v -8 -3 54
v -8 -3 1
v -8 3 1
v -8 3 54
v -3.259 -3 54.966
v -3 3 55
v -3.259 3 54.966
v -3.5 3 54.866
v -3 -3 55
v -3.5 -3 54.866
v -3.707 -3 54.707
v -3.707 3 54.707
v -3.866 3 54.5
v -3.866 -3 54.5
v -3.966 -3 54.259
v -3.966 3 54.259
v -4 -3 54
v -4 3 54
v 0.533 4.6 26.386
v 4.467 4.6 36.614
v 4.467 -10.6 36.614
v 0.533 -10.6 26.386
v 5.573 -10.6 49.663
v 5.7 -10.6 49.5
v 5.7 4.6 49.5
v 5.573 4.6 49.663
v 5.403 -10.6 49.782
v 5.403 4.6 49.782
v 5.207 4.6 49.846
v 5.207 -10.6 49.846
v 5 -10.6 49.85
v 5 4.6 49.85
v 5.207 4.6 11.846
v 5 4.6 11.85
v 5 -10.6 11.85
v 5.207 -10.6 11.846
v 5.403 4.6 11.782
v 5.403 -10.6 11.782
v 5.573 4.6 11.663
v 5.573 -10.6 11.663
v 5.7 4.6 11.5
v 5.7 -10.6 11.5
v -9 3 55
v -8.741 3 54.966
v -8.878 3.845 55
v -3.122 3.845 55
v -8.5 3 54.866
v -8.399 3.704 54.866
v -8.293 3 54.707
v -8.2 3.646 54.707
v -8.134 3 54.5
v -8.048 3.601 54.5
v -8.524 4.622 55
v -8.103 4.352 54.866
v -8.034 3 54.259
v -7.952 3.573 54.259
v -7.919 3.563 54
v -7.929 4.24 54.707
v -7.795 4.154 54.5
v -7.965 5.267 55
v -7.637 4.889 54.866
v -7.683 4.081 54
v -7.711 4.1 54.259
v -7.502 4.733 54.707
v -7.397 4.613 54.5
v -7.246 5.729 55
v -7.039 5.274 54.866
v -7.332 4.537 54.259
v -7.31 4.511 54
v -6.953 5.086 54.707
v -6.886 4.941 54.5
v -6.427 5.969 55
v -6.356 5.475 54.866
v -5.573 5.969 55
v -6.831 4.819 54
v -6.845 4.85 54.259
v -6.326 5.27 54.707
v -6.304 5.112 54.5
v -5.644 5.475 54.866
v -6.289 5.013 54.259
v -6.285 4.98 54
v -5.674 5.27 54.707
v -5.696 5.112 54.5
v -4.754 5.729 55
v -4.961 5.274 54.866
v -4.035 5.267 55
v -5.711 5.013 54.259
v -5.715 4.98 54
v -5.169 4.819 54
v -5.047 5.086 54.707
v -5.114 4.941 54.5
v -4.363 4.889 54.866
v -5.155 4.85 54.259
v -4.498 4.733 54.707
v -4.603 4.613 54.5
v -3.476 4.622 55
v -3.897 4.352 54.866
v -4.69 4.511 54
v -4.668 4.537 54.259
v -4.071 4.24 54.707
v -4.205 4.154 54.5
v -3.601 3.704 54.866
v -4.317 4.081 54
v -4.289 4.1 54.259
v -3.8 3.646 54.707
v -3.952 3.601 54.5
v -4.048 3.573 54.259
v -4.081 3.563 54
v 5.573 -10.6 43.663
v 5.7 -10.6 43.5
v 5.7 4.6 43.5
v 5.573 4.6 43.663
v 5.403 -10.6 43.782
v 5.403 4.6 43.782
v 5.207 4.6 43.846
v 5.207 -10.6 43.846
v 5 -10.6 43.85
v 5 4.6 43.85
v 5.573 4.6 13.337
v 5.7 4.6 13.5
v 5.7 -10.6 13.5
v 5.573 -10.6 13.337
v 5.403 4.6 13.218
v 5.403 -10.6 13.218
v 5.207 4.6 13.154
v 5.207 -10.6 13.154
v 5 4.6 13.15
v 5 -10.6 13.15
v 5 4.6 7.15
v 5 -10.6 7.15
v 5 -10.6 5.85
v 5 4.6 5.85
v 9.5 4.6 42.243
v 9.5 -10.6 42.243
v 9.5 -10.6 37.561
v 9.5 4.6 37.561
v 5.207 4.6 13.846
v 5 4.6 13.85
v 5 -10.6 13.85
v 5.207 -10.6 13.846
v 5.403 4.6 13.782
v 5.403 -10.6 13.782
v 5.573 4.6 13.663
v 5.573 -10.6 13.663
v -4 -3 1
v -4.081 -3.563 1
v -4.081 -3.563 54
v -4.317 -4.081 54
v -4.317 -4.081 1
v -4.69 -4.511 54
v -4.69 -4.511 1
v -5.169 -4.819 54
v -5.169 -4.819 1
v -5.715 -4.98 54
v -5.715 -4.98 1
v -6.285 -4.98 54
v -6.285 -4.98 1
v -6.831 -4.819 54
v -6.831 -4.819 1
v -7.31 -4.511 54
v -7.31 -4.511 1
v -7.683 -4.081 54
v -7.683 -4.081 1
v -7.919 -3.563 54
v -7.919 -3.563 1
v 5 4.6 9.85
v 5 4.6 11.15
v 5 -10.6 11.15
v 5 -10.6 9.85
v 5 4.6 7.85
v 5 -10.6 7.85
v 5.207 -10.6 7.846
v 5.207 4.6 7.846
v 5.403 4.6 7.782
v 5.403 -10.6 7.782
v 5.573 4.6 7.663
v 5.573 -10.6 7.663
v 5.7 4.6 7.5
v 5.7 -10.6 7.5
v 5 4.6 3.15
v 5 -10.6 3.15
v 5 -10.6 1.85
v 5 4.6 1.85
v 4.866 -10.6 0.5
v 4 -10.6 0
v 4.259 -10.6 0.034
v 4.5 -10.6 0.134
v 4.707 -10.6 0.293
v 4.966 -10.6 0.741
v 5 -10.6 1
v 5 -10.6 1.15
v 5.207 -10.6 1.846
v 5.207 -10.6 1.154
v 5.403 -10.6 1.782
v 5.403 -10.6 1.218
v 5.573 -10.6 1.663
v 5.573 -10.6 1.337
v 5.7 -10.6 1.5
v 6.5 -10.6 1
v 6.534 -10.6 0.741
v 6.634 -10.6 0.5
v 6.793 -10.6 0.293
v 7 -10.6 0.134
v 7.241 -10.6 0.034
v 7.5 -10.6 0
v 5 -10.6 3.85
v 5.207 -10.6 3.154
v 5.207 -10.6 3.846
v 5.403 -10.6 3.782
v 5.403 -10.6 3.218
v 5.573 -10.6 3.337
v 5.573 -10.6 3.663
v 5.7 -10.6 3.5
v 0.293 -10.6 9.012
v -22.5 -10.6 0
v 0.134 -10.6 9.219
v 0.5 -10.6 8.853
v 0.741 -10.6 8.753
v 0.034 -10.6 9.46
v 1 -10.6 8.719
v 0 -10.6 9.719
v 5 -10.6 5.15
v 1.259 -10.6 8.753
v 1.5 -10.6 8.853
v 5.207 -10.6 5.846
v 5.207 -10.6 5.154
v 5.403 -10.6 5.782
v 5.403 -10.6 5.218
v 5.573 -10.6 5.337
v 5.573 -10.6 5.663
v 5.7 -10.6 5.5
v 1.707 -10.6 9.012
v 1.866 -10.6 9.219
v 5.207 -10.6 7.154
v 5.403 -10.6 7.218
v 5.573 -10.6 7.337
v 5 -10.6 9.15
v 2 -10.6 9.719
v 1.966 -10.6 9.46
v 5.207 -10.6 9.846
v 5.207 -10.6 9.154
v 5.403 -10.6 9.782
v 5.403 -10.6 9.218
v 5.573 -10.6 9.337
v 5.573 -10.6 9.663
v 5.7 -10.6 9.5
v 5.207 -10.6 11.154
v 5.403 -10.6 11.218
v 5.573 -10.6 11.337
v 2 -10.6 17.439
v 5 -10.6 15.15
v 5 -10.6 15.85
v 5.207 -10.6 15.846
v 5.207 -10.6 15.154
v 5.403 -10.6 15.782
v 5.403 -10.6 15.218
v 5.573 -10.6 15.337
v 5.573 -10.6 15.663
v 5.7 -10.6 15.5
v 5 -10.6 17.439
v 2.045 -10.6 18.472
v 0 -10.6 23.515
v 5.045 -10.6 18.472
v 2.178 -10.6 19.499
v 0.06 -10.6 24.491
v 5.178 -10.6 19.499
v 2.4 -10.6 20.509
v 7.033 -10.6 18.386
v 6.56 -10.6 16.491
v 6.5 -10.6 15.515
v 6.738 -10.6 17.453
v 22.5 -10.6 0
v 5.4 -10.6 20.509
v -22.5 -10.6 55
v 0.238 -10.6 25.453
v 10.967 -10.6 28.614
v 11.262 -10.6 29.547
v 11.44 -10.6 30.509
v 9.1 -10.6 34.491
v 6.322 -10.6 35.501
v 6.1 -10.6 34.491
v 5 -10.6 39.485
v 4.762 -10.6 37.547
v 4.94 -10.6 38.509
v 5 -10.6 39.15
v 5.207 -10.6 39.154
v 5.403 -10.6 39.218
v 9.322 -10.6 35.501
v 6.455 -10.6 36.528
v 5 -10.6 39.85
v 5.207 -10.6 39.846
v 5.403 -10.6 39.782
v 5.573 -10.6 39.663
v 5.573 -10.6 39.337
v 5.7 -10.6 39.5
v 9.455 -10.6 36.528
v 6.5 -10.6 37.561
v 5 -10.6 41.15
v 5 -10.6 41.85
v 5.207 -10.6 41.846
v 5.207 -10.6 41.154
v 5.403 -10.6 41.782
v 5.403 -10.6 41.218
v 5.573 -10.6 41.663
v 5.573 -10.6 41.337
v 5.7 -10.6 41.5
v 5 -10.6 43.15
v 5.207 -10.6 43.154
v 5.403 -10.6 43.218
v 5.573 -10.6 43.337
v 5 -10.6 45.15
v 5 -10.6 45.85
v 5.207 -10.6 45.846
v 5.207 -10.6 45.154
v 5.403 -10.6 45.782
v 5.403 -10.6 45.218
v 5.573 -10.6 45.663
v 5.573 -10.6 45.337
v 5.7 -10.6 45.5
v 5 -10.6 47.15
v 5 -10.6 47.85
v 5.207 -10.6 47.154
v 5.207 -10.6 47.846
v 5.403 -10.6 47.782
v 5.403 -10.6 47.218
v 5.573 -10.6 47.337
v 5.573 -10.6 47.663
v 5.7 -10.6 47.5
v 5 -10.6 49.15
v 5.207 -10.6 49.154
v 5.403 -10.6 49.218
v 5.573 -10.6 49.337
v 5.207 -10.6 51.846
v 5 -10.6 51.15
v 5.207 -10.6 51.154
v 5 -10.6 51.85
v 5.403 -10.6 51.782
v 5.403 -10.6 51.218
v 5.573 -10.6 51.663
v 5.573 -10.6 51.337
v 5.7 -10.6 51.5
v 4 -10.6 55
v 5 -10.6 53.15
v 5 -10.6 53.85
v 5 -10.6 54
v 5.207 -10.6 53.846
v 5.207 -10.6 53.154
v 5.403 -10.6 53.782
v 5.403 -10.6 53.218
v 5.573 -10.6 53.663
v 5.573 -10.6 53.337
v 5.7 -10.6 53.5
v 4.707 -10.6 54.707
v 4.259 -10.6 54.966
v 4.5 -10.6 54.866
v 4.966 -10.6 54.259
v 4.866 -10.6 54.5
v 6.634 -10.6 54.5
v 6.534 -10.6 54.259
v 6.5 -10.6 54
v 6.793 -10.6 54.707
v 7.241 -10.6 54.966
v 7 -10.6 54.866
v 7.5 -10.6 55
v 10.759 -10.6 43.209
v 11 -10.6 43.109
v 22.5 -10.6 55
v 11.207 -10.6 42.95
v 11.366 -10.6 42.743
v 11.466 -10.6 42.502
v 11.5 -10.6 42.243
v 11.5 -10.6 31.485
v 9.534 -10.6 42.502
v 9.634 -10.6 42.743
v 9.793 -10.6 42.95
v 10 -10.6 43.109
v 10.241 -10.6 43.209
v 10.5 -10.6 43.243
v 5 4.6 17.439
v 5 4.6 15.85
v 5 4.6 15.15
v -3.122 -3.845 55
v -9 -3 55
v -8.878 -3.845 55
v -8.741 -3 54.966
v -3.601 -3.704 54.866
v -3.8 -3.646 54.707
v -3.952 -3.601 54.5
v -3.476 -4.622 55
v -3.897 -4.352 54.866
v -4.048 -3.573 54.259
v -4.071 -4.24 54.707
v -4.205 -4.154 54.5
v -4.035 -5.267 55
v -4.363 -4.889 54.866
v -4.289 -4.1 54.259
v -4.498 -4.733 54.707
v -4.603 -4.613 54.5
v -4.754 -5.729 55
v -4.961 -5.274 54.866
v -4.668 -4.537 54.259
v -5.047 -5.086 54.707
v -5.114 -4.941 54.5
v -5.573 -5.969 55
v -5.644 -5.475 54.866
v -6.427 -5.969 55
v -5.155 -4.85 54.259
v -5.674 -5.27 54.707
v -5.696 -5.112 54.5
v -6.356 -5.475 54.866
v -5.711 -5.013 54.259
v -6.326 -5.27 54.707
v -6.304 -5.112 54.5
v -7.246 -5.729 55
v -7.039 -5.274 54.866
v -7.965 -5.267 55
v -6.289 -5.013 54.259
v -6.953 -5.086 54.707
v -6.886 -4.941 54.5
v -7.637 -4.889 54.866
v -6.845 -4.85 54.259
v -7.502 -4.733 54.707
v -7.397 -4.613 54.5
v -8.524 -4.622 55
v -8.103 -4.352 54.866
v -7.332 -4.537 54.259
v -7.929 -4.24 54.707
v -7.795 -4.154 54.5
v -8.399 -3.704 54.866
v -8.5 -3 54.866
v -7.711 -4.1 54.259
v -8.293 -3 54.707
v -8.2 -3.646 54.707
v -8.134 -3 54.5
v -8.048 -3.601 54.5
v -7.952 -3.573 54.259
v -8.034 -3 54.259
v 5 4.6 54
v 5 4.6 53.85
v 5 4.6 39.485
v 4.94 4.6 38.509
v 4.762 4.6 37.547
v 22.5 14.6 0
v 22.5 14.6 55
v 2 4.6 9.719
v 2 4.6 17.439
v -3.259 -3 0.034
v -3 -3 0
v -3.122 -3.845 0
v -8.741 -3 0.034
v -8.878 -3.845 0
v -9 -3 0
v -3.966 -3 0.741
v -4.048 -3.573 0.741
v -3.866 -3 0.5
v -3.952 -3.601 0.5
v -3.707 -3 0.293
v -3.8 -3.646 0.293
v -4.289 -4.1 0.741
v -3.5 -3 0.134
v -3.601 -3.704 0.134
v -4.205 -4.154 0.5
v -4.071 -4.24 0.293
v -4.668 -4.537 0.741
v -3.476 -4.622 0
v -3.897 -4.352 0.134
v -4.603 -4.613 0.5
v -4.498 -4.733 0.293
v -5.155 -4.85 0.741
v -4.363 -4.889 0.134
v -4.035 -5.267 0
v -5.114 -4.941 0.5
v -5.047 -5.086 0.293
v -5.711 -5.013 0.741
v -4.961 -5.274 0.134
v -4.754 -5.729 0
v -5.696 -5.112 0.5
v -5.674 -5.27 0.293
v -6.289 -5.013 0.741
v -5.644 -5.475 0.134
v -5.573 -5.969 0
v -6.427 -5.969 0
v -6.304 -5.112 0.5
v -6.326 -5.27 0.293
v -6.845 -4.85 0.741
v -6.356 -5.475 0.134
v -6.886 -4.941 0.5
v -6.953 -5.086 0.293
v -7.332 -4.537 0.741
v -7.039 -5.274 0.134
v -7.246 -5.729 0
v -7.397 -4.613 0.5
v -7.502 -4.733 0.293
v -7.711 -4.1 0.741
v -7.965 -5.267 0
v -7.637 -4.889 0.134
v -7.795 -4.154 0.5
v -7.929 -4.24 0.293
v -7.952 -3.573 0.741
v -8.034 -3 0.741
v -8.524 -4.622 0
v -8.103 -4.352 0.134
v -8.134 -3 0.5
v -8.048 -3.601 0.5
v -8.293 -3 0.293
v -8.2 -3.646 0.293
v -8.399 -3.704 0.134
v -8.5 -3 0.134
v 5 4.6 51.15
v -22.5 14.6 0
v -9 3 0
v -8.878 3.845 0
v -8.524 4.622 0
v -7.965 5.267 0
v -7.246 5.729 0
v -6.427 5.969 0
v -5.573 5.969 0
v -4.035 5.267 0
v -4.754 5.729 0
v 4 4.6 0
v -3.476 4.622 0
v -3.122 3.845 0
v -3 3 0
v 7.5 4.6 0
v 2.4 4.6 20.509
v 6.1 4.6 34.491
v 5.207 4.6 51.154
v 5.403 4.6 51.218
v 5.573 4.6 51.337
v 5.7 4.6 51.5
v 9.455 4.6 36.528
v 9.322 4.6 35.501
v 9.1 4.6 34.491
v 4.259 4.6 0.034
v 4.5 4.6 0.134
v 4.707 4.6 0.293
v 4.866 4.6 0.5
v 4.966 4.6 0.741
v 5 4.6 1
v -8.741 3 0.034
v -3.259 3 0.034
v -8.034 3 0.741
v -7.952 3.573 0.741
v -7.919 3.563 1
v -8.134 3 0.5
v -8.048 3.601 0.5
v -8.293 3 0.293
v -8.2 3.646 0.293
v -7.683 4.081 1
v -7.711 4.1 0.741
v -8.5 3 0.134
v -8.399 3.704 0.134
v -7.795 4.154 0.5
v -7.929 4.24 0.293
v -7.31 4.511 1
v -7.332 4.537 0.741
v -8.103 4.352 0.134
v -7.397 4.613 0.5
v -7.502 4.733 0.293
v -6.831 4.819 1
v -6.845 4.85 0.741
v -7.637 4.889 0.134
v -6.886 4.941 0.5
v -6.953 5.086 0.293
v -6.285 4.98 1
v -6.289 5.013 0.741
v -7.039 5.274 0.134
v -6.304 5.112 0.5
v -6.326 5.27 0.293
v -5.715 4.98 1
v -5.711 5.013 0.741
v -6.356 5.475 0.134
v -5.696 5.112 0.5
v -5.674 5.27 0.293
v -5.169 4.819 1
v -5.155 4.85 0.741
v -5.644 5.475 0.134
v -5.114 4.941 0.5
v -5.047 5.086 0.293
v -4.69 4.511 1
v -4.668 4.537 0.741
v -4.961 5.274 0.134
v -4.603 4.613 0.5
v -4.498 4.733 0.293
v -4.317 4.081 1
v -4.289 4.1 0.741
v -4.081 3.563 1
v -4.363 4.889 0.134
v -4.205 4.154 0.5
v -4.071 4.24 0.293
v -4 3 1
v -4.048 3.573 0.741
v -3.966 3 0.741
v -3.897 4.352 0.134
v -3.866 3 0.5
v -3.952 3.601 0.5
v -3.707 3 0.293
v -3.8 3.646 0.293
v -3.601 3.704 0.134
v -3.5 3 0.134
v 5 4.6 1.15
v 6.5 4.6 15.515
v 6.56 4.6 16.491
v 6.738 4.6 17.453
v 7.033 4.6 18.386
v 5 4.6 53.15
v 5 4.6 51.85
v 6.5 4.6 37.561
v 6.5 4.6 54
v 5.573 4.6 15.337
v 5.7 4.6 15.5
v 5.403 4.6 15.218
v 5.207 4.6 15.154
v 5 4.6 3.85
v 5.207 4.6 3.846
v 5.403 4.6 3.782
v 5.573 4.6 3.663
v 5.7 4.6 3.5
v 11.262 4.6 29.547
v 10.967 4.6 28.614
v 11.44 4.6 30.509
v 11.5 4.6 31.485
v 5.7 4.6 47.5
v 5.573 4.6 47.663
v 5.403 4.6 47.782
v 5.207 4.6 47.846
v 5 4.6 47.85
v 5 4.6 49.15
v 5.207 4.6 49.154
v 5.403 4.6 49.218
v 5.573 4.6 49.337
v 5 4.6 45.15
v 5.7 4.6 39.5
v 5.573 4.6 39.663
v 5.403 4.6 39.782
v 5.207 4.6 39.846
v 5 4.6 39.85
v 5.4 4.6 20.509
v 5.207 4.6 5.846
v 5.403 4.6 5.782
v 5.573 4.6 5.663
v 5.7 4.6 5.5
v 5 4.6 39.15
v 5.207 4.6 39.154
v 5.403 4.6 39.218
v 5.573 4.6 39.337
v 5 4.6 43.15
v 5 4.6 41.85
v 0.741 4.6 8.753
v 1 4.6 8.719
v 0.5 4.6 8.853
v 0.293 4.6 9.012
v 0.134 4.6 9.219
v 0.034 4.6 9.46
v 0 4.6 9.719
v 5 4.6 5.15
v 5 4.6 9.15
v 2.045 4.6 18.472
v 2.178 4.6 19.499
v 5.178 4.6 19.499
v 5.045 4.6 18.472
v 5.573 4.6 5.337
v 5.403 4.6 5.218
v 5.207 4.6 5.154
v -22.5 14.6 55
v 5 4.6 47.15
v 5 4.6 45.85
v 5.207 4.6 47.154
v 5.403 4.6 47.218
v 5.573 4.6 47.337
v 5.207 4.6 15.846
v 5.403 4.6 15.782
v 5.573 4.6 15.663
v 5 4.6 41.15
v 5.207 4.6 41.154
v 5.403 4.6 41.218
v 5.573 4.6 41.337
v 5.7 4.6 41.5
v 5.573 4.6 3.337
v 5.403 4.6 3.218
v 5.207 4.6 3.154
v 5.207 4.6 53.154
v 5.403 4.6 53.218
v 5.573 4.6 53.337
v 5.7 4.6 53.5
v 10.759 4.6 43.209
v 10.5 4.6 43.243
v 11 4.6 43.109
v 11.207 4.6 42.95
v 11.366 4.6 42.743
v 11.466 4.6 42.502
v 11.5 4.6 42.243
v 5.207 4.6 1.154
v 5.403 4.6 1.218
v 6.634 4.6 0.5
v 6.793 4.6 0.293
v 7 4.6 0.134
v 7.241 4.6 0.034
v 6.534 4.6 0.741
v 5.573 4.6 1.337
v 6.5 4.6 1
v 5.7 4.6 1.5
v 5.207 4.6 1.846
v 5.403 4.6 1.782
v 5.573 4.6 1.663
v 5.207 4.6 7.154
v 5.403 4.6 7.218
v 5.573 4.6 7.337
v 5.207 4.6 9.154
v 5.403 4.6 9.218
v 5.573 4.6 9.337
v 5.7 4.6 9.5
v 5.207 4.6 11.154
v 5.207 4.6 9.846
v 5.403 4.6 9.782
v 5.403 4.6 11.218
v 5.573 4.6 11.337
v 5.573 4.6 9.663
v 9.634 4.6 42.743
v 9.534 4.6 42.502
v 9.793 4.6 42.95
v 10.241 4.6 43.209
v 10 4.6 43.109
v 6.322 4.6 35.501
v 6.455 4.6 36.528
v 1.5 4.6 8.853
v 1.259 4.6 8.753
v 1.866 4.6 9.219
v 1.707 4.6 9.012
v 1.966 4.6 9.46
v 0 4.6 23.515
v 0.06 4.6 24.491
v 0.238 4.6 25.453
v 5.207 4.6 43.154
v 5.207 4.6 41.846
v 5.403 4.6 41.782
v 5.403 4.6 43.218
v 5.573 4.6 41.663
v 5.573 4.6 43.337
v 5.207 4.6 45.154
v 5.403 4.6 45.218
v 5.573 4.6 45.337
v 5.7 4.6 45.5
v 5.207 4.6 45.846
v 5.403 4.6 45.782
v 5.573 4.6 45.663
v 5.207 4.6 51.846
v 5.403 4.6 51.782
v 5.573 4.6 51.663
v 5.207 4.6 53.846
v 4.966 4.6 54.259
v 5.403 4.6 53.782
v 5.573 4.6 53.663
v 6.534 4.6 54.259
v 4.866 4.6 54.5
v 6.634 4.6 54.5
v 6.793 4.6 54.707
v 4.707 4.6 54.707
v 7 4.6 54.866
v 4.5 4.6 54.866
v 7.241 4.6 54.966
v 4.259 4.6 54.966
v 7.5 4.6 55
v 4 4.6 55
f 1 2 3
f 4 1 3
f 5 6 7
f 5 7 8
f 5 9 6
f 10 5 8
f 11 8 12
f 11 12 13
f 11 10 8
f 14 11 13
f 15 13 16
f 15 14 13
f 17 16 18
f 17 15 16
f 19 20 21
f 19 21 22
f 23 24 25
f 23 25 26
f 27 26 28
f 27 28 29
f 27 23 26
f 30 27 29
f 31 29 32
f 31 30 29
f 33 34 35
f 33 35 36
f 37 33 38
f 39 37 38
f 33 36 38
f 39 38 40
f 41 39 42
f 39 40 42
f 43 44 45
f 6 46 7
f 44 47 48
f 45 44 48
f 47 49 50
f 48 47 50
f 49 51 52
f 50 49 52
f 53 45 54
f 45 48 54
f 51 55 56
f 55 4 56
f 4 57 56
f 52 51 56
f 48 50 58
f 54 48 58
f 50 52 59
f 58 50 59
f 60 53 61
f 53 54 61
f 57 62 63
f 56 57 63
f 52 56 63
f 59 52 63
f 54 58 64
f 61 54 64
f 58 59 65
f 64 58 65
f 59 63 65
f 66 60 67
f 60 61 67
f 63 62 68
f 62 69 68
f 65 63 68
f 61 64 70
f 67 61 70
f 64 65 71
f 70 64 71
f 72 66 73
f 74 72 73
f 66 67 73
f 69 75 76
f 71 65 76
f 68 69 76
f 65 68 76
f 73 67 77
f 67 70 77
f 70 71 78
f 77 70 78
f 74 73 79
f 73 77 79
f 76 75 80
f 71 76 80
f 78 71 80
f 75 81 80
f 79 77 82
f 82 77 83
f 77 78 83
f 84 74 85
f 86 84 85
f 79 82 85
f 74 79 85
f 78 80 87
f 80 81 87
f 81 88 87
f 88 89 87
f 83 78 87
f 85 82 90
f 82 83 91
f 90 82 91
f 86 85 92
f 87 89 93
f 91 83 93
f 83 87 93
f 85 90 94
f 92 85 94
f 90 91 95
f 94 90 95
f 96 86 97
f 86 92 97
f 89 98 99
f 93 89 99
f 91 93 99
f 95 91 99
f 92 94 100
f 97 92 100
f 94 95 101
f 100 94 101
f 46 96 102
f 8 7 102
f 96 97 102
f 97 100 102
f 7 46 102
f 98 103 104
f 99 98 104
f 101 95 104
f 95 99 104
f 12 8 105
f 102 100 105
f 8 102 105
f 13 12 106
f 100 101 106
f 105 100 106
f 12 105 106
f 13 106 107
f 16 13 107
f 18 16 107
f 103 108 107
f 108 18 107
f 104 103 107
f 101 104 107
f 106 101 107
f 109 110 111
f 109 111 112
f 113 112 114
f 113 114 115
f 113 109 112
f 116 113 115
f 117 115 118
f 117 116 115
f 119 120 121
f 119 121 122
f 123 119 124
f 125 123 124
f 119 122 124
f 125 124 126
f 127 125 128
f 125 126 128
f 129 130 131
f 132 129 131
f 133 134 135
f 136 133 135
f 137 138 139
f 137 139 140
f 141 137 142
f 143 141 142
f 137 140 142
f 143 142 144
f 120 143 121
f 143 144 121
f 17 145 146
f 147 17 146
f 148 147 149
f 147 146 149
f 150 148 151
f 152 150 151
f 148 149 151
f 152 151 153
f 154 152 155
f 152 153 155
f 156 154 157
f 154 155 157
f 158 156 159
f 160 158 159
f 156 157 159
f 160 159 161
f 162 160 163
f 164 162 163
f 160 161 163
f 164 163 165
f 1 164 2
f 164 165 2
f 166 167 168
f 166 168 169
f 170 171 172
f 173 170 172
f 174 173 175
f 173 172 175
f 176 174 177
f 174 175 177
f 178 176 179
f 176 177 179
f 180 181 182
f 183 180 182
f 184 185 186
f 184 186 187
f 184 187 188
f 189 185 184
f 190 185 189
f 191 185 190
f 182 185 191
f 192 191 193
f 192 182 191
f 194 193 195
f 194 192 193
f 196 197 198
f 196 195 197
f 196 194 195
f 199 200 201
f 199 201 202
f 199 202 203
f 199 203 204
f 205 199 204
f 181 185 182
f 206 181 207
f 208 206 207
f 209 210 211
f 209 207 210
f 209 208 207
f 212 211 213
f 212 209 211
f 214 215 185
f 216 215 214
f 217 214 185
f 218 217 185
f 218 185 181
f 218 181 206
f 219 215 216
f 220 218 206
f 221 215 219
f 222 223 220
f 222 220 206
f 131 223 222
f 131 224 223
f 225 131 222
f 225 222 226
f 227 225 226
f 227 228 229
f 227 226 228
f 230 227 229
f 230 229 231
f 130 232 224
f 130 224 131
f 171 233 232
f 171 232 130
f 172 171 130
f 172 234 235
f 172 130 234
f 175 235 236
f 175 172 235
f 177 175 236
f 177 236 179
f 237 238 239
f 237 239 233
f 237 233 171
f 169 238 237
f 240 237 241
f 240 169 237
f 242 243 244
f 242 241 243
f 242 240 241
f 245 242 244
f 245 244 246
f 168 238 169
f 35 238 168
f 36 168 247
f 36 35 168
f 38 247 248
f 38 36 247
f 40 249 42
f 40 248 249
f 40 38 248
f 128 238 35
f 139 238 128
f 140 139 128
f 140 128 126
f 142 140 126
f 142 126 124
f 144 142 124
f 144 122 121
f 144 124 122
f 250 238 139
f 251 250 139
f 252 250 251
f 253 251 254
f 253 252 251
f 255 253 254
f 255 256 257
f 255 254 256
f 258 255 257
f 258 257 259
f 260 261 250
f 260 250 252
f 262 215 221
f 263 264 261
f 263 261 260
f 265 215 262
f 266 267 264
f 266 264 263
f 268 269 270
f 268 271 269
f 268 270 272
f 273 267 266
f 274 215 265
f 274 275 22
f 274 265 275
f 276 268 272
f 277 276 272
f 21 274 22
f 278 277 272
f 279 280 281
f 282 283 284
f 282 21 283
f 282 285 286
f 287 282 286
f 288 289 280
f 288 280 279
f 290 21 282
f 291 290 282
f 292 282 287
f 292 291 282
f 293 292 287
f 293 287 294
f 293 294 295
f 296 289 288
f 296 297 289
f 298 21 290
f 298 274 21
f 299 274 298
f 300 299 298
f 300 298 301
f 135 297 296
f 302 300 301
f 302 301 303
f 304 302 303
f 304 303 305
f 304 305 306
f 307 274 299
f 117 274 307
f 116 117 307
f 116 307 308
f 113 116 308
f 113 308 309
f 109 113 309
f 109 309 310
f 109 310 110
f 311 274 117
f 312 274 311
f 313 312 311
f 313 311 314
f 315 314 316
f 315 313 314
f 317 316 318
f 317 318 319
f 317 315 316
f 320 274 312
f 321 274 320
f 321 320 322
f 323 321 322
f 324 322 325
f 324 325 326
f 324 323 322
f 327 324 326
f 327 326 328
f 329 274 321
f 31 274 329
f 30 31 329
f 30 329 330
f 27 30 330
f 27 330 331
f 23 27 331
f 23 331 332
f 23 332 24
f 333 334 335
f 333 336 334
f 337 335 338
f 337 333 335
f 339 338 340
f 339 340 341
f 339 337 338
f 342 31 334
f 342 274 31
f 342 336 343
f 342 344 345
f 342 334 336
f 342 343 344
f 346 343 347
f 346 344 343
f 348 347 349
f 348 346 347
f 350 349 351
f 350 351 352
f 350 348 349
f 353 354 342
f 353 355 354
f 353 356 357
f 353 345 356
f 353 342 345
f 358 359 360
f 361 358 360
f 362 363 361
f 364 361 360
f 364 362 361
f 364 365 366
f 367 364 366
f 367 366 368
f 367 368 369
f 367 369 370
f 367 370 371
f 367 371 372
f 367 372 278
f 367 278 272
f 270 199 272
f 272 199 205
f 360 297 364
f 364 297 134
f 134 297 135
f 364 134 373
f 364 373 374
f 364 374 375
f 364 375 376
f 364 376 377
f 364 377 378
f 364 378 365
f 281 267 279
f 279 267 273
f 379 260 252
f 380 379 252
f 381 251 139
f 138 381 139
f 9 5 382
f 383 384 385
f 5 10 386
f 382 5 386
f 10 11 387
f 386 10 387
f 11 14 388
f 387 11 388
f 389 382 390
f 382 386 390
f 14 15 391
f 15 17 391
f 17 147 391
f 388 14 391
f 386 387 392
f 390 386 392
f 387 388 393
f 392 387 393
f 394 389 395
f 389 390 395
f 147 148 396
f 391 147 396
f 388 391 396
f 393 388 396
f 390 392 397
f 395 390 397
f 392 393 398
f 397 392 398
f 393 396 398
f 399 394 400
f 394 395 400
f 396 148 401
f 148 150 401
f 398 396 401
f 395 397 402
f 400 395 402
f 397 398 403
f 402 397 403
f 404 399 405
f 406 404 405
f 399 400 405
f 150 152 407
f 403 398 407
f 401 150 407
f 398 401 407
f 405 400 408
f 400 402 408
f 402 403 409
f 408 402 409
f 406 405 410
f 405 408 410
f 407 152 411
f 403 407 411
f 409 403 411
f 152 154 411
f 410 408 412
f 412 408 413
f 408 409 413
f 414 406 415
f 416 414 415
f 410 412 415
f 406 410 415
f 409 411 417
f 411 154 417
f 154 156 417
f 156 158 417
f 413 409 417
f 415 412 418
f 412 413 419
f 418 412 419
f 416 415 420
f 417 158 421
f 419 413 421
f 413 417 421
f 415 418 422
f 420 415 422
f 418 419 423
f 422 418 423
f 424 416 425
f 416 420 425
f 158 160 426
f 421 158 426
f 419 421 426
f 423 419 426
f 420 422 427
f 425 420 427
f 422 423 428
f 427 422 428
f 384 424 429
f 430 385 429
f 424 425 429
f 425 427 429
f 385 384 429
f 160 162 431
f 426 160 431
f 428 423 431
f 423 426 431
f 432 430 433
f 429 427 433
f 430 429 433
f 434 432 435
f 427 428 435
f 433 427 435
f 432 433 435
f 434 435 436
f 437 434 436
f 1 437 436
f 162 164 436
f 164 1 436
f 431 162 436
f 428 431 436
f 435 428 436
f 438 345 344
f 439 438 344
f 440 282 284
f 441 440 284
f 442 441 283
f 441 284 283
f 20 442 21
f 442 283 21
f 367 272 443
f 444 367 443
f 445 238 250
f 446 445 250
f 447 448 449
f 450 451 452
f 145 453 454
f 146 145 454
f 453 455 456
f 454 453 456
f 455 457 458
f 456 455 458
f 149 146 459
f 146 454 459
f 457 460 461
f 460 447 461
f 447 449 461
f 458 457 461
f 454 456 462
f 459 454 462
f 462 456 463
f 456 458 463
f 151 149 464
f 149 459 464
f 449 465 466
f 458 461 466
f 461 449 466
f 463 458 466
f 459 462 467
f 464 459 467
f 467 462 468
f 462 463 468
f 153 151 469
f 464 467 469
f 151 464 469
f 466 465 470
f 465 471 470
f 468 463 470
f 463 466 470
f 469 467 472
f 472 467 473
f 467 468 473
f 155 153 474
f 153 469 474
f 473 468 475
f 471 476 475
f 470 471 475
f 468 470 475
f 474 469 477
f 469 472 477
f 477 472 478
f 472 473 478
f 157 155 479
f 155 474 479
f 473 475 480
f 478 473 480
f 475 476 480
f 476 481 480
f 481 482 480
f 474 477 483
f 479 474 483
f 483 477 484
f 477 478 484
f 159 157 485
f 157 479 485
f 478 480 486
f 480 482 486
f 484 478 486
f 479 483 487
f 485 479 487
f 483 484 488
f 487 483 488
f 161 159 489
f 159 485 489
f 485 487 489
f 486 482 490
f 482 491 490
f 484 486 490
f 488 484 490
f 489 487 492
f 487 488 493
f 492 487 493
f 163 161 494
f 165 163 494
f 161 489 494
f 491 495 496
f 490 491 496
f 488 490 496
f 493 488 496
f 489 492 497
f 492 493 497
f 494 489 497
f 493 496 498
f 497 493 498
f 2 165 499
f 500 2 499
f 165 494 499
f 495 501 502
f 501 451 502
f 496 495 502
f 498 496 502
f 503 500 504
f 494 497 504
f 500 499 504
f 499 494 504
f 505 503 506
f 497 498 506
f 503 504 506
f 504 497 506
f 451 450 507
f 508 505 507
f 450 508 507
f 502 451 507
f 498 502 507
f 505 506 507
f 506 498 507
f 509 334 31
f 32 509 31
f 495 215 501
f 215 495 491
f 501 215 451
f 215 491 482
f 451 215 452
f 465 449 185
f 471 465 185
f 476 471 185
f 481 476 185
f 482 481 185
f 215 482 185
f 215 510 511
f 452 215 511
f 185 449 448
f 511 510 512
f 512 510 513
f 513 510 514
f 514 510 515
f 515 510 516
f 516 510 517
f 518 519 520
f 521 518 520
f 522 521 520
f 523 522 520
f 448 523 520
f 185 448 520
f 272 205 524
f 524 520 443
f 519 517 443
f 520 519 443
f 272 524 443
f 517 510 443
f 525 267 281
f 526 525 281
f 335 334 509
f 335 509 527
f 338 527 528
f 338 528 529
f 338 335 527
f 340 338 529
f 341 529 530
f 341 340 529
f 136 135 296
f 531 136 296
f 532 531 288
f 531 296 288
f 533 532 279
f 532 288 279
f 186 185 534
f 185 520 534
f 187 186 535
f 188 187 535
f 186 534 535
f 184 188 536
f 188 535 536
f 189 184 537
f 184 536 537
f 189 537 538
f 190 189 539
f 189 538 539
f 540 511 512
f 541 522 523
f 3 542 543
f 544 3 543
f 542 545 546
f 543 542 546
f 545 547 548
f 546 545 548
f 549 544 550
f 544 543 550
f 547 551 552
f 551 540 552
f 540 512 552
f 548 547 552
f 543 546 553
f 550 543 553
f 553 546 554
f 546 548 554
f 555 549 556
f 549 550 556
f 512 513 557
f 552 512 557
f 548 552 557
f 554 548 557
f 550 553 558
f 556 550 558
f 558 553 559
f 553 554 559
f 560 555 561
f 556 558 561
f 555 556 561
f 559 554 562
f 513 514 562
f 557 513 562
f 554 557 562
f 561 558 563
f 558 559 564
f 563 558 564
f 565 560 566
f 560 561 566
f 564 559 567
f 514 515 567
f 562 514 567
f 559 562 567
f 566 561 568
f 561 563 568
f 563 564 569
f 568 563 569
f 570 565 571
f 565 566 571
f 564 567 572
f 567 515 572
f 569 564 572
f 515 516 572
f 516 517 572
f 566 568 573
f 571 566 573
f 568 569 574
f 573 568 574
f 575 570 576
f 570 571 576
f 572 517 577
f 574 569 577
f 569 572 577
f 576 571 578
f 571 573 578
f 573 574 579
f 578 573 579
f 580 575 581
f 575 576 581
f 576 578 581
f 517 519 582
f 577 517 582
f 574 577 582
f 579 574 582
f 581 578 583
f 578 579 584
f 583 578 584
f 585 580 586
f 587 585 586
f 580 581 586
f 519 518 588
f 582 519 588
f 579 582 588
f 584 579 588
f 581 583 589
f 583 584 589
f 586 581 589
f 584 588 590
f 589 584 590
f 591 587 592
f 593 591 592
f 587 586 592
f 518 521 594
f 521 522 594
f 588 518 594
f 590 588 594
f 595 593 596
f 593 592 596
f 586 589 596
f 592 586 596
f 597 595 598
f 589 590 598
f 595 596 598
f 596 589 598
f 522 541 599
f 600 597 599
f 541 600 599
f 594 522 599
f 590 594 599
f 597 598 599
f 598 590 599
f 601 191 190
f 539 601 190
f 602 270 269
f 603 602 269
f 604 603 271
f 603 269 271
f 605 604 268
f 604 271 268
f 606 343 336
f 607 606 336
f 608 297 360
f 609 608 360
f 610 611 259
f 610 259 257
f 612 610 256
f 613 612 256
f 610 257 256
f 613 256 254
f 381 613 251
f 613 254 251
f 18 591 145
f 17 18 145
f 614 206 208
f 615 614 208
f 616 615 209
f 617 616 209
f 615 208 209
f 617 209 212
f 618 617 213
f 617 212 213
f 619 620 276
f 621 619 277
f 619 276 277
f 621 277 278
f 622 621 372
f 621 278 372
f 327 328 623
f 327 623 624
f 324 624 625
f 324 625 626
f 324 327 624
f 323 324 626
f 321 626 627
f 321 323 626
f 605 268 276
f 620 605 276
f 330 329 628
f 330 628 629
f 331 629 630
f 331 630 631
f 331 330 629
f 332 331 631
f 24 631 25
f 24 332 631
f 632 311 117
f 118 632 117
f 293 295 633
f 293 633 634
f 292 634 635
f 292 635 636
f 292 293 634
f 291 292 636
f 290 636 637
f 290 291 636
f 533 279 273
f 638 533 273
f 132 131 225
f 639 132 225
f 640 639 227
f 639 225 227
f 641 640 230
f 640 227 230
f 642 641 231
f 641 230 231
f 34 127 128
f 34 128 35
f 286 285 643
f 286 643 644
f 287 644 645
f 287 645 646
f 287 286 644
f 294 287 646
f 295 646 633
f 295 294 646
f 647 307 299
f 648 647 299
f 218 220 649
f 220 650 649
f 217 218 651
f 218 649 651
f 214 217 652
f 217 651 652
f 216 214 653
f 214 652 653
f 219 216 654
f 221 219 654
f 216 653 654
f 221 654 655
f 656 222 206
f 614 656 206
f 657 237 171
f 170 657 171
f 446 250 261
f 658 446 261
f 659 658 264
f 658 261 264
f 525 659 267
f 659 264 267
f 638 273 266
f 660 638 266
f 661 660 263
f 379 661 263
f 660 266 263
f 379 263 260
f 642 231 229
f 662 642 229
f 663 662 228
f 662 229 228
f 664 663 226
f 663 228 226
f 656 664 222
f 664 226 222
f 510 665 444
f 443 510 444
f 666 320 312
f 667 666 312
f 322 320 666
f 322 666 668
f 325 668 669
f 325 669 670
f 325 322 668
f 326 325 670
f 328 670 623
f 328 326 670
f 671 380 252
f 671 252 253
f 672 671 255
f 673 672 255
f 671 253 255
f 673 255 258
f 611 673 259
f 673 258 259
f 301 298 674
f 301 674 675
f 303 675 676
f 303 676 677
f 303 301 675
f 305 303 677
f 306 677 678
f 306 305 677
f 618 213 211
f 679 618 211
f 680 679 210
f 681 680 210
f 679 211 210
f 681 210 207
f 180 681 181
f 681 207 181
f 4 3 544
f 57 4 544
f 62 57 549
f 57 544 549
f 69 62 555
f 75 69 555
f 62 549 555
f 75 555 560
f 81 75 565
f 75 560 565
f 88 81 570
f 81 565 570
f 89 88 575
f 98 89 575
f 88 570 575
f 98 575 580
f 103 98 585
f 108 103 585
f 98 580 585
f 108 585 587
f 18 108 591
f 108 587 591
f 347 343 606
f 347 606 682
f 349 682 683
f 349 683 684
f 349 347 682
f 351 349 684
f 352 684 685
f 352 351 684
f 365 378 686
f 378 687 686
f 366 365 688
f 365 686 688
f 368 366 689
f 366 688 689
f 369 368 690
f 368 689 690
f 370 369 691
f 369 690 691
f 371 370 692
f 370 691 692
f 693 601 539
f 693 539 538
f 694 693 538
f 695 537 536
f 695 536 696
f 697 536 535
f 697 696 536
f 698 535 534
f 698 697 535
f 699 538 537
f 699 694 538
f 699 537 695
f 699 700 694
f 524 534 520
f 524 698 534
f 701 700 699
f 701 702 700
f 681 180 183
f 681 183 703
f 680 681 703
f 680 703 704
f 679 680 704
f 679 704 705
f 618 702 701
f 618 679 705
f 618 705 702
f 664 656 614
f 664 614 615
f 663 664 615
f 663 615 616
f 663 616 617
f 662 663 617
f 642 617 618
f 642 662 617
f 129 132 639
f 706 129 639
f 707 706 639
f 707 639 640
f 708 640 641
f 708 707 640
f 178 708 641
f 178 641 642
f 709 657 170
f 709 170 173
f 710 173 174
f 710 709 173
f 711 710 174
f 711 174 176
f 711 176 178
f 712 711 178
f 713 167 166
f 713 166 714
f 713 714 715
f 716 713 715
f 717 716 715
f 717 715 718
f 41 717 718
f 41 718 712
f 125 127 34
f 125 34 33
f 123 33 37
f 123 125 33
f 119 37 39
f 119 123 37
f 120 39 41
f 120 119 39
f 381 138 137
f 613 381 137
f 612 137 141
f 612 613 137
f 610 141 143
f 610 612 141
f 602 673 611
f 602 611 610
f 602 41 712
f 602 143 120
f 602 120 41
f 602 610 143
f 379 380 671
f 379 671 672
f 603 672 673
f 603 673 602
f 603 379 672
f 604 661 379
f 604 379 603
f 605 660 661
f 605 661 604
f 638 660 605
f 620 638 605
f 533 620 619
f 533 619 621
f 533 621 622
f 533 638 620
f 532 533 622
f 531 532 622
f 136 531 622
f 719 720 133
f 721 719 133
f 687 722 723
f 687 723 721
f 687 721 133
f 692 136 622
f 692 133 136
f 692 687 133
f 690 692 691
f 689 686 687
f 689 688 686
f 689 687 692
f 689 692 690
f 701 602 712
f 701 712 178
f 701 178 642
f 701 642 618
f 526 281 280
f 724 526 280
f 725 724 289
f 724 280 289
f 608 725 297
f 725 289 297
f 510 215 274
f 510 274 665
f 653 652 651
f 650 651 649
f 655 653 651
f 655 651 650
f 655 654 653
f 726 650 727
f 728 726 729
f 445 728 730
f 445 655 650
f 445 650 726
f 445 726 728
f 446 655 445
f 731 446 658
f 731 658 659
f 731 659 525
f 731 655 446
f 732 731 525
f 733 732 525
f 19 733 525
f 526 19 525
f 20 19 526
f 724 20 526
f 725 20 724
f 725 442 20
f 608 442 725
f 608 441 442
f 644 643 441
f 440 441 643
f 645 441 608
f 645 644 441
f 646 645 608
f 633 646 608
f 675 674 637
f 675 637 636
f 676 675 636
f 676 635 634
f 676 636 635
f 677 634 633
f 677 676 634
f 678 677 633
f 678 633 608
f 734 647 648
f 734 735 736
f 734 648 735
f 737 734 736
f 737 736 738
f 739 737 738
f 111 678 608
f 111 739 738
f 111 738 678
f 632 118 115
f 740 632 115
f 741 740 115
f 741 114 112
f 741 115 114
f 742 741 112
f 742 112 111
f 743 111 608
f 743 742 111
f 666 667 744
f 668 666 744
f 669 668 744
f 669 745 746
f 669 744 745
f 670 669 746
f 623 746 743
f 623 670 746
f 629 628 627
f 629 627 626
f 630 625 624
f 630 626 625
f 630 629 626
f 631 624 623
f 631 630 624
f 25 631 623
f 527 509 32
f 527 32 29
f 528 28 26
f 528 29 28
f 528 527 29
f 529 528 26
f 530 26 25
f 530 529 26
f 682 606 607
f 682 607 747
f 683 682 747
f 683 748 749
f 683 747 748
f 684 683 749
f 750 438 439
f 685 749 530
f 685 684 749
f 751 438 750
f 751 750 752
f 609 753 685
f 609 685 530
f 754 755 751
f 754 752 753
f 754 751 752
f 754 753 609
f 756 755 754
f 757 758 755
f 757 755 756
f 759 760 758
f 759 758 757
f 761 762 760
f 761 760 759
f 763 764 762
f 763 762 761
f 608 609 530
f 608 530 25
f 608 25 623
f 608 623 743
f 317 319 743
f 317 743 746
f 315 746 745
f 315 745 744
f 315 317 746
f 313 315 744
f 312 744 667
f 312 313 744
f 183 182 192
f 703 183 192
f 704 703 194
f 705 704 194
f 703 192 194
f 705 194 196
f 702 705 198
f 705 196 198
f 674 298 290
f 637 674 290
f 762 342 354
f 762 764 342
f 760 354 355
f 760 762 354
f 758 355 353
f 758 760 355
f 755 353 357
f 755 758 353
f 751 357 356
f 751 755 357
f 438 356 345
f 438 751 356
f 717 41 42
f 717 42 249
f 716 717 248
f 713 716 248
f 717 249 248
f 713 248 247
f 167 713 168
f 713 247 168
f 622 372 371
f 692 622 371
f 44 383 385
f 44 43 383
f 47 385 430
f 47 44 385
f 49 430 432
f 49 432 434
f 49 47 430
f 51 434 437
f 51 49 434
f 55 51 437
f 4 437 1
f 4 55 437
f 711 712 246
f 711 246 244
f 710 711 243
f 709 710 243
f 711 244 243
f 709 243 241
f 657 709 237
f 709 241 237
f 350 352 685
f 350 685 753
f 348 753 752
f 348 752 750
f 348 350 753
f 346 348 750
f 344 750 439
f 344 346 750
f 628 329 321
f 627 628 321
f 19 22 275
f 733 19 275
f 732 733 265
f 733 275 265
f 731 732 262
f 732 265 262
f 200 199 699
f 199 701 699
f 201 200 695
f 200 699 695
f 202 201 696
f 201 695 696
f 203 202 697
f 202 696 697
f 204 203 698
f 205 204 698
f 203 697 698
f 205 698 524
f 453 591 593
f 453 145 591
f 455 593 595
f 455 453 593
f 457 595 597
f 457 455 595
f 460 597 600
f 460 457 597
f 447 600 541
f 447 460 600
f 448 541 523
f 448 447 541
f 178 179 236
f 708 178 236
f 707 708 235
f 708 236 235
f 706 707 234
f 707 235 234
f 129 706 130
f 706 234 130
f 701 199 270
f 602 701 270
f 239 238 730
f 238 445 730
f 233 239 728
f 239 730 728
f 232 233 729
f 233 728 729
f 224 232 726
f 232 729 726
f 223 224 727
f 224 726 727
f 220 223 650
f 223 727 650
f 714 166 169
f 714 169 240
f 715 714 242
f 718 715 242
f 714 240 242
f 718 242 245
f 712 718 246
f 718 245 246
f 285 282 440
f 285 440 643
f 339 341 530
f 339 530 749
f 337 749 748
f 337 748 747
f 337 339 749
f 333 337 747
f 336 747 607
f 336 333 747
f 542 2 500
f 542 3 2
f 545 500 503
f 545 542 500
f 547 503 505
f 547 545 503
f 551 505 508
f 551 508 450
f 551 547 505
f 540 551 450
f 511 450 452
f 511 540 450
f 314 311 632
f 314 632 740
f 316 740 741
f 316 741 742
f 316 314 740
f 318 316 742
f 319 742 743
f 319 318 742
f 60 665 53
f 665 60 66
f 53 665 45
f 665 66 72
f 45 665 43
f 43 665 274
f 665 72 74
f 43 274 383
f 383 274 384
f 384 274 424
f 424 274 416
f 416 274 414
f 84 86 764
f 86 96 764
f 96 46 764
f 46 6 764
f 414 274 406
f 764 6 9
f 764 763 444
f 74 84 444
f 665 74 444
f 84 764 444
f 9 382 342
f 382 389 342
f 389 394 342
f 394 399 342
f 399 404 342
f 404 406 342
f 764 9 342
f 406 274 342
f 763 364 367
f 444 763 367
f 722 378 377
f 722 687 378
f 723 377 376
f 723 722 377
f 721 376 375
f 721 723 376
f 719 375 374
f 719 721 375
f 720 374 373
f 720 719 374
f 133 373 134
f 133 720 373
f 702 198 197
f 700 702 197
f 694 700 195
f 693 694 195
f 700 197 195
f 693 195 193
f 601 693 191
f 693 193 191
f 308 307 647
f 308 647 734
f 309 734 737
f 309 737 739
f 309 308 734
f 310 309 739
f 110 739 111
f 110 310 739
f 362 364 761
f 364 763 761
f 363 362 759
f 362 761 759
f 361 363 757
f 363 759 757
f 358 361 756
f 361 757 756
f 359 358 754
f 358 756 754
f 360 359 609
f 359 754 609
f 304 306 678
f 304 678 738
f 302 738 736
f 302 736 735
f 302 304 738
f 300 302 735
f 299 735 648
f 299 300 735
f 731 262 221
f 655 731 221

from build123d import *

# Parameters (mm, degrees)
ESQUISSE1_W             = 45
ESQUISSE1_H             = 25.2
BOSS_EXTRU_1_DEPTH      = 55
ENL_V_MAT_EXTRU_1_DEPTH = 15.2
ESQUISSE4_W             = 2
ESQUISSE4_H             = 11.757289378
ESQUISSE4_H_2           = 8.71932614
BOSS_EXTRU_2_DEPTH      = 15.2
BOSS_EXTRU_3_DEPTH      = 15.2
CONG_2_R                = 1
CONG_5_R                = 1
CONG_10_R               = 1


with BuildPart() as part:
    # Esquisse1 → Boss.-Extru.1 (new body)
    with BuildSketch(Plane.XY):
        with Locations((0, 2)):
            Rectangle(ESQUISSE1_W, ESQUISSE1_H)
        with BuildLine():
            Line((-4, 3), (-4, -3))
            ThreePointArc((-4, -3), (-6, -5), (-8, -3))
            Line((-8, -3), (-8, 3))
            ThreePointArc((-8, 3), (-6, 5), (-4, 3))
        make_face(mode=Mode.SUBTRACT)
    extrude(amount=BOSS_EXTRU_1_DEPTH)

    # Esquisse3 → Enlèv. mat.-Extru.1 (cut)
    with BuildSketch(Plane.XZ.offset(10.6)):
        with BuildLine():
            Line((5, 55), (5, 39.485421243))
            ThreePointArc((5, 39.485421243), (4.865561607, 38.024962206), (4.46676485, 36.613588609))
            Line((4.46676485, 36.613588609), (0.53323515, 26.386411391))
            ThreePointArc((0.53323515, 26.386411391), (0.134438393, 24.975037794), (0, 23.514578757))
            Line((0, 23.514578757), (0, 0))
            Line((0, 0), (2, 0))
            Line((2, 0), (2, 17.43865228))
            ThreePointArc((2, 17.43865228), (2.100303516, 18.986949278), (2.399537266, 20.509363004))
            Line((2.399537266, 20.509363004), (6.100462734, 34.490636996))
            ThreePointArc((6.100462734, 34.490636996), (6.399696484, 36.013050722), (6.5, 37.56134772))
            Line((6.5, 37.56134772), (6.5, 55))
            Line((6.5, 55), (5, 55))
        make_face()
        with BuildLine():
            Line((5, 17.43865228), (5, 0))
            Line((5, 0), (6.5, 0))
            Line((6.5, 0), (6.5, 15.514578757))
            ThreePointArc((6.5, 15.514578757), (6.634438393, 16.975037794), (7.03323515, 18.386411391))
            Line((7.03323515, 18.386411391), (10.96676485, 28.613588609))
            ThreePointArc((10.96676485, 28.613588609), (11.365561607, 30.024962206), (11.5, 31.485421243))
            Line((11.5, 31.485421243), (11.5, 55))
            Line((11.5, 55), (9.5, 55))
            Line((9.5, 55), (9.5, 37.56134772))
            ThreePointArc((9.5, 37.56134772), (9.399696484, 36.013050722), (9.100462734, 34.490636996))
            Line((9.100462734, 34.490636996), (5.399537266, 20.509363004))
            ThreePointArc((5.399537266, 20.509363004), (5.100303516, 18.986949278), (5, 17.43865228))
        make_face()
    extrude(amount=-ENL_V_MAT_EXTRU_1_DEPTH, mode=Mode.SUBTRACT)

    # Esquisse4 → Boss.-Extru.2 (add)
    with BuildSketch(Plane.XZ.offset(10.6)):
        with Locations((10.5, 49.121355311)):
            Rectangle(ESQUISSE4_W, ESQUISSE4_H)
        with Locations((1, 4.35966307)):
            Rectangle(ESQUISSE4_W, ESQUISSE4_H_2)
    extrude(amount=-BOSS_EXTRU_2_DEPTH)

    # Esquisse5 → Boss.-Extru.3 (add)
    with BuildSketch(Plane.XZ.offset(10.6)):
        with BuildLine():
            Line((5, 53.85), (5, 53.15))
            ThreePointArc((5, 53.15), (5.40348257, 53.21803486), (5.7, 53.5))
            ThreePointArc((5.7, 53.5), (5.40348257, 53.78196514), (5, 53.85))
        make_face()
        with BuildLine():
            Line((5, 51.85), (5, 51.15))
            ThreePointArc((5, 51.15), (5.40348257, 51.21803486), (5.7, 51.5))
            ThreePointArc((5.7, 51.5), (5.40348257, 51.78196514), (5, 51.85))
        make_face()
        with BuildLine():
            Line((5, 49.85), (5, 49.15))
            ThreePointArc((5, 49.15), (5.40348257, 49.21803486), (5.7, 49.5))
            ThreePointArc((5.7, 49.5), (5.40348257, 49.78196514), (5, 49.85))
        make_face()
        with BuildLine():
            Line((5, 47.85), (5, 47.15))
            ThreePointArc((5, 47.15), (5.40348257, 47.21803486), (5.7, 47.5))
            ThreePointArc((5.7, 47.5), (5.40348257, 47.78196514), (5, 47.85))
        make_face()
        with BuildLine():
            Line((5, 45.85), (5, 45.15))
            ThreePointArc((5, 45.15), (5.40348257, 45.21803486), (5.7, 45.5))
            ThreePointArc((5.7, 45.5), (5.40348257, 45.78196514), (5, 45.85))
        make_face()
        with BuildLine():
            Line((5, 43.85), (5, 43.15))
            ThreePointArc((5, 43.15), (5.40348257, 43.21803486), (5.7, 43.5))
            ThreePointArc((5.7, 43.5), (5.40348257, 43.78196514), (5, 43.85))
        make_face()
        with BuildLine():
            Line((5, 41.85), (5, 41.15))
            ThreePointArc((5, 41.15), (5.40348257, 41.21803486), (5.7, 41.5))
            ThreePointArc((5.7, 41.5), (5.40348257, 41.78196514), (5, 41.85))
        make_face()
        with BuildLine():
            Line((5, 39.85), (5, 39.15))
            ThreePointArc((5, 39.15), (5.40348257, 39.21803486), (5.7, 39.5))
            ThreePointArc((5.7, 39.5), (5.40348257, 39.78196514), (5, 39.85))
        make_face()
        with BuildLine():
            Line((5, 1.15), (5, 1.85))
            ThreePointArc((5, 1.85), (5.40348257, 1.78196514), (5.7, 1.5))
            ThreePointArc((5.7, 1.5), (5.40348257, 1.21803486), (5, 1.15))
        make_face()
        with BuildLine():
            Line((5, 15.15), (5, 15.85))
            ThreePointArc((5, 15.85), (5.40348257, 15.78196514), (5.7, 15.5))
            ThreePointArc((5.7, 15.5), (5.40348257, 15.21803486), (5, 15.15))
        make_face()
        with BuildLine():
            Line((5, 13.15), (5, 13.85))
            ThreePointArc((5, 13.85), (5.40348257, 13.78196514), (5.7, 13.5))
            ThreePointArc((5.7, 13.5), (5.40348257, 13.21803486), (5, 13.15))
        make_face()
        with BuildLine():
            Line((5, 11.15), (5, 11.85))
            ThreePointArc((5, 11.85), (5.40348257, 11.78196514), (5.7, 11.5))
            ThreePointArc((5.7, 11.5), (5.40348257, 11.21803486), (5, 11.15))
        make_face()
        with BuildLine():
            Line((5, 9.15), (5, 9.85))
            ThreePointArc((5, 9.85), (5.40348257, 9.78196514), (5.7, 9.5))
            ThreePointArc((5.7, 9.5), (5.40348257, 9.21803486), (5, 9.15))
        make_face()
        with BuildLine():
            Line((5, 7.15), (5, 7.85))
            ThreePointArc((5, 7.85), (5.40348257, 7.78196514), (5.7, 7.5))
            ThreePointArc((5.7, 7.5), (5.40348257, 7.21803486), (5, 7.15))
        make_face()
        with BuildLine():
            Line((5, 5.15), (5, 5.85))
            ThreePointArc((5, 5.85), (5.40348257, 5.78196514), (5.7, 5.5))
            ThreePointArc((5.7, 5.5), (5.40348257, 5.21803486), (5, 5.15))
        make_face()
        with BuildLine():
            Line((5, 3.15), (5, 3.85))
            ThreePointArc((5, 3.85), (5.40348257, 3.78196514), (5.7, 3.5))
            ThreePointArc((5.7, 3.5), (5.40348257, 3.21803486), (5, 3.15))
        make_face()
    extrude(amount=-BOSS_EXTRU_3_DEPTH)

    # Congé2
    cong_2_edges = [part.edges().sort_by_distance(p)[0] for p in [
        (2, -3, 8.71932614),
        (0, -3, 8.71932614),
        (11.5, -3, 43.242710622),
        (9.5, -3, 43.242710622),
    ]]
    fillet(cong_2_edges, radius=CONG_2_R - 0.0001)  # a hair under: the kernel refuses the full size

    # Congé5
    cong_5_edges = [part.edges().sort_by_distance(p)[0] for p in [
        (5, -3, 55),
        (6.5, -3, 55),
        (6.5, -3, 0),
        (5, -3, 0),
    ]]
    fillet(cong_5_edges, radius=CONG_5_R)

    # Congé10
    cong_10_edges = [part.edges().sort_by_distance(p)[0] for p in [
        (-6, 5, 0),
        (-8, 0, 0),
        (-6, -5, 0),
        (-4, 0, 0),
        (-6, 5, 55),
        (-8, 0, 55),
        (-6, -5, 55),
        (-4, 0, 55),
    ]]
    fillet(cong_10_edges, radius=CONG_10_R)


solid = part.part
